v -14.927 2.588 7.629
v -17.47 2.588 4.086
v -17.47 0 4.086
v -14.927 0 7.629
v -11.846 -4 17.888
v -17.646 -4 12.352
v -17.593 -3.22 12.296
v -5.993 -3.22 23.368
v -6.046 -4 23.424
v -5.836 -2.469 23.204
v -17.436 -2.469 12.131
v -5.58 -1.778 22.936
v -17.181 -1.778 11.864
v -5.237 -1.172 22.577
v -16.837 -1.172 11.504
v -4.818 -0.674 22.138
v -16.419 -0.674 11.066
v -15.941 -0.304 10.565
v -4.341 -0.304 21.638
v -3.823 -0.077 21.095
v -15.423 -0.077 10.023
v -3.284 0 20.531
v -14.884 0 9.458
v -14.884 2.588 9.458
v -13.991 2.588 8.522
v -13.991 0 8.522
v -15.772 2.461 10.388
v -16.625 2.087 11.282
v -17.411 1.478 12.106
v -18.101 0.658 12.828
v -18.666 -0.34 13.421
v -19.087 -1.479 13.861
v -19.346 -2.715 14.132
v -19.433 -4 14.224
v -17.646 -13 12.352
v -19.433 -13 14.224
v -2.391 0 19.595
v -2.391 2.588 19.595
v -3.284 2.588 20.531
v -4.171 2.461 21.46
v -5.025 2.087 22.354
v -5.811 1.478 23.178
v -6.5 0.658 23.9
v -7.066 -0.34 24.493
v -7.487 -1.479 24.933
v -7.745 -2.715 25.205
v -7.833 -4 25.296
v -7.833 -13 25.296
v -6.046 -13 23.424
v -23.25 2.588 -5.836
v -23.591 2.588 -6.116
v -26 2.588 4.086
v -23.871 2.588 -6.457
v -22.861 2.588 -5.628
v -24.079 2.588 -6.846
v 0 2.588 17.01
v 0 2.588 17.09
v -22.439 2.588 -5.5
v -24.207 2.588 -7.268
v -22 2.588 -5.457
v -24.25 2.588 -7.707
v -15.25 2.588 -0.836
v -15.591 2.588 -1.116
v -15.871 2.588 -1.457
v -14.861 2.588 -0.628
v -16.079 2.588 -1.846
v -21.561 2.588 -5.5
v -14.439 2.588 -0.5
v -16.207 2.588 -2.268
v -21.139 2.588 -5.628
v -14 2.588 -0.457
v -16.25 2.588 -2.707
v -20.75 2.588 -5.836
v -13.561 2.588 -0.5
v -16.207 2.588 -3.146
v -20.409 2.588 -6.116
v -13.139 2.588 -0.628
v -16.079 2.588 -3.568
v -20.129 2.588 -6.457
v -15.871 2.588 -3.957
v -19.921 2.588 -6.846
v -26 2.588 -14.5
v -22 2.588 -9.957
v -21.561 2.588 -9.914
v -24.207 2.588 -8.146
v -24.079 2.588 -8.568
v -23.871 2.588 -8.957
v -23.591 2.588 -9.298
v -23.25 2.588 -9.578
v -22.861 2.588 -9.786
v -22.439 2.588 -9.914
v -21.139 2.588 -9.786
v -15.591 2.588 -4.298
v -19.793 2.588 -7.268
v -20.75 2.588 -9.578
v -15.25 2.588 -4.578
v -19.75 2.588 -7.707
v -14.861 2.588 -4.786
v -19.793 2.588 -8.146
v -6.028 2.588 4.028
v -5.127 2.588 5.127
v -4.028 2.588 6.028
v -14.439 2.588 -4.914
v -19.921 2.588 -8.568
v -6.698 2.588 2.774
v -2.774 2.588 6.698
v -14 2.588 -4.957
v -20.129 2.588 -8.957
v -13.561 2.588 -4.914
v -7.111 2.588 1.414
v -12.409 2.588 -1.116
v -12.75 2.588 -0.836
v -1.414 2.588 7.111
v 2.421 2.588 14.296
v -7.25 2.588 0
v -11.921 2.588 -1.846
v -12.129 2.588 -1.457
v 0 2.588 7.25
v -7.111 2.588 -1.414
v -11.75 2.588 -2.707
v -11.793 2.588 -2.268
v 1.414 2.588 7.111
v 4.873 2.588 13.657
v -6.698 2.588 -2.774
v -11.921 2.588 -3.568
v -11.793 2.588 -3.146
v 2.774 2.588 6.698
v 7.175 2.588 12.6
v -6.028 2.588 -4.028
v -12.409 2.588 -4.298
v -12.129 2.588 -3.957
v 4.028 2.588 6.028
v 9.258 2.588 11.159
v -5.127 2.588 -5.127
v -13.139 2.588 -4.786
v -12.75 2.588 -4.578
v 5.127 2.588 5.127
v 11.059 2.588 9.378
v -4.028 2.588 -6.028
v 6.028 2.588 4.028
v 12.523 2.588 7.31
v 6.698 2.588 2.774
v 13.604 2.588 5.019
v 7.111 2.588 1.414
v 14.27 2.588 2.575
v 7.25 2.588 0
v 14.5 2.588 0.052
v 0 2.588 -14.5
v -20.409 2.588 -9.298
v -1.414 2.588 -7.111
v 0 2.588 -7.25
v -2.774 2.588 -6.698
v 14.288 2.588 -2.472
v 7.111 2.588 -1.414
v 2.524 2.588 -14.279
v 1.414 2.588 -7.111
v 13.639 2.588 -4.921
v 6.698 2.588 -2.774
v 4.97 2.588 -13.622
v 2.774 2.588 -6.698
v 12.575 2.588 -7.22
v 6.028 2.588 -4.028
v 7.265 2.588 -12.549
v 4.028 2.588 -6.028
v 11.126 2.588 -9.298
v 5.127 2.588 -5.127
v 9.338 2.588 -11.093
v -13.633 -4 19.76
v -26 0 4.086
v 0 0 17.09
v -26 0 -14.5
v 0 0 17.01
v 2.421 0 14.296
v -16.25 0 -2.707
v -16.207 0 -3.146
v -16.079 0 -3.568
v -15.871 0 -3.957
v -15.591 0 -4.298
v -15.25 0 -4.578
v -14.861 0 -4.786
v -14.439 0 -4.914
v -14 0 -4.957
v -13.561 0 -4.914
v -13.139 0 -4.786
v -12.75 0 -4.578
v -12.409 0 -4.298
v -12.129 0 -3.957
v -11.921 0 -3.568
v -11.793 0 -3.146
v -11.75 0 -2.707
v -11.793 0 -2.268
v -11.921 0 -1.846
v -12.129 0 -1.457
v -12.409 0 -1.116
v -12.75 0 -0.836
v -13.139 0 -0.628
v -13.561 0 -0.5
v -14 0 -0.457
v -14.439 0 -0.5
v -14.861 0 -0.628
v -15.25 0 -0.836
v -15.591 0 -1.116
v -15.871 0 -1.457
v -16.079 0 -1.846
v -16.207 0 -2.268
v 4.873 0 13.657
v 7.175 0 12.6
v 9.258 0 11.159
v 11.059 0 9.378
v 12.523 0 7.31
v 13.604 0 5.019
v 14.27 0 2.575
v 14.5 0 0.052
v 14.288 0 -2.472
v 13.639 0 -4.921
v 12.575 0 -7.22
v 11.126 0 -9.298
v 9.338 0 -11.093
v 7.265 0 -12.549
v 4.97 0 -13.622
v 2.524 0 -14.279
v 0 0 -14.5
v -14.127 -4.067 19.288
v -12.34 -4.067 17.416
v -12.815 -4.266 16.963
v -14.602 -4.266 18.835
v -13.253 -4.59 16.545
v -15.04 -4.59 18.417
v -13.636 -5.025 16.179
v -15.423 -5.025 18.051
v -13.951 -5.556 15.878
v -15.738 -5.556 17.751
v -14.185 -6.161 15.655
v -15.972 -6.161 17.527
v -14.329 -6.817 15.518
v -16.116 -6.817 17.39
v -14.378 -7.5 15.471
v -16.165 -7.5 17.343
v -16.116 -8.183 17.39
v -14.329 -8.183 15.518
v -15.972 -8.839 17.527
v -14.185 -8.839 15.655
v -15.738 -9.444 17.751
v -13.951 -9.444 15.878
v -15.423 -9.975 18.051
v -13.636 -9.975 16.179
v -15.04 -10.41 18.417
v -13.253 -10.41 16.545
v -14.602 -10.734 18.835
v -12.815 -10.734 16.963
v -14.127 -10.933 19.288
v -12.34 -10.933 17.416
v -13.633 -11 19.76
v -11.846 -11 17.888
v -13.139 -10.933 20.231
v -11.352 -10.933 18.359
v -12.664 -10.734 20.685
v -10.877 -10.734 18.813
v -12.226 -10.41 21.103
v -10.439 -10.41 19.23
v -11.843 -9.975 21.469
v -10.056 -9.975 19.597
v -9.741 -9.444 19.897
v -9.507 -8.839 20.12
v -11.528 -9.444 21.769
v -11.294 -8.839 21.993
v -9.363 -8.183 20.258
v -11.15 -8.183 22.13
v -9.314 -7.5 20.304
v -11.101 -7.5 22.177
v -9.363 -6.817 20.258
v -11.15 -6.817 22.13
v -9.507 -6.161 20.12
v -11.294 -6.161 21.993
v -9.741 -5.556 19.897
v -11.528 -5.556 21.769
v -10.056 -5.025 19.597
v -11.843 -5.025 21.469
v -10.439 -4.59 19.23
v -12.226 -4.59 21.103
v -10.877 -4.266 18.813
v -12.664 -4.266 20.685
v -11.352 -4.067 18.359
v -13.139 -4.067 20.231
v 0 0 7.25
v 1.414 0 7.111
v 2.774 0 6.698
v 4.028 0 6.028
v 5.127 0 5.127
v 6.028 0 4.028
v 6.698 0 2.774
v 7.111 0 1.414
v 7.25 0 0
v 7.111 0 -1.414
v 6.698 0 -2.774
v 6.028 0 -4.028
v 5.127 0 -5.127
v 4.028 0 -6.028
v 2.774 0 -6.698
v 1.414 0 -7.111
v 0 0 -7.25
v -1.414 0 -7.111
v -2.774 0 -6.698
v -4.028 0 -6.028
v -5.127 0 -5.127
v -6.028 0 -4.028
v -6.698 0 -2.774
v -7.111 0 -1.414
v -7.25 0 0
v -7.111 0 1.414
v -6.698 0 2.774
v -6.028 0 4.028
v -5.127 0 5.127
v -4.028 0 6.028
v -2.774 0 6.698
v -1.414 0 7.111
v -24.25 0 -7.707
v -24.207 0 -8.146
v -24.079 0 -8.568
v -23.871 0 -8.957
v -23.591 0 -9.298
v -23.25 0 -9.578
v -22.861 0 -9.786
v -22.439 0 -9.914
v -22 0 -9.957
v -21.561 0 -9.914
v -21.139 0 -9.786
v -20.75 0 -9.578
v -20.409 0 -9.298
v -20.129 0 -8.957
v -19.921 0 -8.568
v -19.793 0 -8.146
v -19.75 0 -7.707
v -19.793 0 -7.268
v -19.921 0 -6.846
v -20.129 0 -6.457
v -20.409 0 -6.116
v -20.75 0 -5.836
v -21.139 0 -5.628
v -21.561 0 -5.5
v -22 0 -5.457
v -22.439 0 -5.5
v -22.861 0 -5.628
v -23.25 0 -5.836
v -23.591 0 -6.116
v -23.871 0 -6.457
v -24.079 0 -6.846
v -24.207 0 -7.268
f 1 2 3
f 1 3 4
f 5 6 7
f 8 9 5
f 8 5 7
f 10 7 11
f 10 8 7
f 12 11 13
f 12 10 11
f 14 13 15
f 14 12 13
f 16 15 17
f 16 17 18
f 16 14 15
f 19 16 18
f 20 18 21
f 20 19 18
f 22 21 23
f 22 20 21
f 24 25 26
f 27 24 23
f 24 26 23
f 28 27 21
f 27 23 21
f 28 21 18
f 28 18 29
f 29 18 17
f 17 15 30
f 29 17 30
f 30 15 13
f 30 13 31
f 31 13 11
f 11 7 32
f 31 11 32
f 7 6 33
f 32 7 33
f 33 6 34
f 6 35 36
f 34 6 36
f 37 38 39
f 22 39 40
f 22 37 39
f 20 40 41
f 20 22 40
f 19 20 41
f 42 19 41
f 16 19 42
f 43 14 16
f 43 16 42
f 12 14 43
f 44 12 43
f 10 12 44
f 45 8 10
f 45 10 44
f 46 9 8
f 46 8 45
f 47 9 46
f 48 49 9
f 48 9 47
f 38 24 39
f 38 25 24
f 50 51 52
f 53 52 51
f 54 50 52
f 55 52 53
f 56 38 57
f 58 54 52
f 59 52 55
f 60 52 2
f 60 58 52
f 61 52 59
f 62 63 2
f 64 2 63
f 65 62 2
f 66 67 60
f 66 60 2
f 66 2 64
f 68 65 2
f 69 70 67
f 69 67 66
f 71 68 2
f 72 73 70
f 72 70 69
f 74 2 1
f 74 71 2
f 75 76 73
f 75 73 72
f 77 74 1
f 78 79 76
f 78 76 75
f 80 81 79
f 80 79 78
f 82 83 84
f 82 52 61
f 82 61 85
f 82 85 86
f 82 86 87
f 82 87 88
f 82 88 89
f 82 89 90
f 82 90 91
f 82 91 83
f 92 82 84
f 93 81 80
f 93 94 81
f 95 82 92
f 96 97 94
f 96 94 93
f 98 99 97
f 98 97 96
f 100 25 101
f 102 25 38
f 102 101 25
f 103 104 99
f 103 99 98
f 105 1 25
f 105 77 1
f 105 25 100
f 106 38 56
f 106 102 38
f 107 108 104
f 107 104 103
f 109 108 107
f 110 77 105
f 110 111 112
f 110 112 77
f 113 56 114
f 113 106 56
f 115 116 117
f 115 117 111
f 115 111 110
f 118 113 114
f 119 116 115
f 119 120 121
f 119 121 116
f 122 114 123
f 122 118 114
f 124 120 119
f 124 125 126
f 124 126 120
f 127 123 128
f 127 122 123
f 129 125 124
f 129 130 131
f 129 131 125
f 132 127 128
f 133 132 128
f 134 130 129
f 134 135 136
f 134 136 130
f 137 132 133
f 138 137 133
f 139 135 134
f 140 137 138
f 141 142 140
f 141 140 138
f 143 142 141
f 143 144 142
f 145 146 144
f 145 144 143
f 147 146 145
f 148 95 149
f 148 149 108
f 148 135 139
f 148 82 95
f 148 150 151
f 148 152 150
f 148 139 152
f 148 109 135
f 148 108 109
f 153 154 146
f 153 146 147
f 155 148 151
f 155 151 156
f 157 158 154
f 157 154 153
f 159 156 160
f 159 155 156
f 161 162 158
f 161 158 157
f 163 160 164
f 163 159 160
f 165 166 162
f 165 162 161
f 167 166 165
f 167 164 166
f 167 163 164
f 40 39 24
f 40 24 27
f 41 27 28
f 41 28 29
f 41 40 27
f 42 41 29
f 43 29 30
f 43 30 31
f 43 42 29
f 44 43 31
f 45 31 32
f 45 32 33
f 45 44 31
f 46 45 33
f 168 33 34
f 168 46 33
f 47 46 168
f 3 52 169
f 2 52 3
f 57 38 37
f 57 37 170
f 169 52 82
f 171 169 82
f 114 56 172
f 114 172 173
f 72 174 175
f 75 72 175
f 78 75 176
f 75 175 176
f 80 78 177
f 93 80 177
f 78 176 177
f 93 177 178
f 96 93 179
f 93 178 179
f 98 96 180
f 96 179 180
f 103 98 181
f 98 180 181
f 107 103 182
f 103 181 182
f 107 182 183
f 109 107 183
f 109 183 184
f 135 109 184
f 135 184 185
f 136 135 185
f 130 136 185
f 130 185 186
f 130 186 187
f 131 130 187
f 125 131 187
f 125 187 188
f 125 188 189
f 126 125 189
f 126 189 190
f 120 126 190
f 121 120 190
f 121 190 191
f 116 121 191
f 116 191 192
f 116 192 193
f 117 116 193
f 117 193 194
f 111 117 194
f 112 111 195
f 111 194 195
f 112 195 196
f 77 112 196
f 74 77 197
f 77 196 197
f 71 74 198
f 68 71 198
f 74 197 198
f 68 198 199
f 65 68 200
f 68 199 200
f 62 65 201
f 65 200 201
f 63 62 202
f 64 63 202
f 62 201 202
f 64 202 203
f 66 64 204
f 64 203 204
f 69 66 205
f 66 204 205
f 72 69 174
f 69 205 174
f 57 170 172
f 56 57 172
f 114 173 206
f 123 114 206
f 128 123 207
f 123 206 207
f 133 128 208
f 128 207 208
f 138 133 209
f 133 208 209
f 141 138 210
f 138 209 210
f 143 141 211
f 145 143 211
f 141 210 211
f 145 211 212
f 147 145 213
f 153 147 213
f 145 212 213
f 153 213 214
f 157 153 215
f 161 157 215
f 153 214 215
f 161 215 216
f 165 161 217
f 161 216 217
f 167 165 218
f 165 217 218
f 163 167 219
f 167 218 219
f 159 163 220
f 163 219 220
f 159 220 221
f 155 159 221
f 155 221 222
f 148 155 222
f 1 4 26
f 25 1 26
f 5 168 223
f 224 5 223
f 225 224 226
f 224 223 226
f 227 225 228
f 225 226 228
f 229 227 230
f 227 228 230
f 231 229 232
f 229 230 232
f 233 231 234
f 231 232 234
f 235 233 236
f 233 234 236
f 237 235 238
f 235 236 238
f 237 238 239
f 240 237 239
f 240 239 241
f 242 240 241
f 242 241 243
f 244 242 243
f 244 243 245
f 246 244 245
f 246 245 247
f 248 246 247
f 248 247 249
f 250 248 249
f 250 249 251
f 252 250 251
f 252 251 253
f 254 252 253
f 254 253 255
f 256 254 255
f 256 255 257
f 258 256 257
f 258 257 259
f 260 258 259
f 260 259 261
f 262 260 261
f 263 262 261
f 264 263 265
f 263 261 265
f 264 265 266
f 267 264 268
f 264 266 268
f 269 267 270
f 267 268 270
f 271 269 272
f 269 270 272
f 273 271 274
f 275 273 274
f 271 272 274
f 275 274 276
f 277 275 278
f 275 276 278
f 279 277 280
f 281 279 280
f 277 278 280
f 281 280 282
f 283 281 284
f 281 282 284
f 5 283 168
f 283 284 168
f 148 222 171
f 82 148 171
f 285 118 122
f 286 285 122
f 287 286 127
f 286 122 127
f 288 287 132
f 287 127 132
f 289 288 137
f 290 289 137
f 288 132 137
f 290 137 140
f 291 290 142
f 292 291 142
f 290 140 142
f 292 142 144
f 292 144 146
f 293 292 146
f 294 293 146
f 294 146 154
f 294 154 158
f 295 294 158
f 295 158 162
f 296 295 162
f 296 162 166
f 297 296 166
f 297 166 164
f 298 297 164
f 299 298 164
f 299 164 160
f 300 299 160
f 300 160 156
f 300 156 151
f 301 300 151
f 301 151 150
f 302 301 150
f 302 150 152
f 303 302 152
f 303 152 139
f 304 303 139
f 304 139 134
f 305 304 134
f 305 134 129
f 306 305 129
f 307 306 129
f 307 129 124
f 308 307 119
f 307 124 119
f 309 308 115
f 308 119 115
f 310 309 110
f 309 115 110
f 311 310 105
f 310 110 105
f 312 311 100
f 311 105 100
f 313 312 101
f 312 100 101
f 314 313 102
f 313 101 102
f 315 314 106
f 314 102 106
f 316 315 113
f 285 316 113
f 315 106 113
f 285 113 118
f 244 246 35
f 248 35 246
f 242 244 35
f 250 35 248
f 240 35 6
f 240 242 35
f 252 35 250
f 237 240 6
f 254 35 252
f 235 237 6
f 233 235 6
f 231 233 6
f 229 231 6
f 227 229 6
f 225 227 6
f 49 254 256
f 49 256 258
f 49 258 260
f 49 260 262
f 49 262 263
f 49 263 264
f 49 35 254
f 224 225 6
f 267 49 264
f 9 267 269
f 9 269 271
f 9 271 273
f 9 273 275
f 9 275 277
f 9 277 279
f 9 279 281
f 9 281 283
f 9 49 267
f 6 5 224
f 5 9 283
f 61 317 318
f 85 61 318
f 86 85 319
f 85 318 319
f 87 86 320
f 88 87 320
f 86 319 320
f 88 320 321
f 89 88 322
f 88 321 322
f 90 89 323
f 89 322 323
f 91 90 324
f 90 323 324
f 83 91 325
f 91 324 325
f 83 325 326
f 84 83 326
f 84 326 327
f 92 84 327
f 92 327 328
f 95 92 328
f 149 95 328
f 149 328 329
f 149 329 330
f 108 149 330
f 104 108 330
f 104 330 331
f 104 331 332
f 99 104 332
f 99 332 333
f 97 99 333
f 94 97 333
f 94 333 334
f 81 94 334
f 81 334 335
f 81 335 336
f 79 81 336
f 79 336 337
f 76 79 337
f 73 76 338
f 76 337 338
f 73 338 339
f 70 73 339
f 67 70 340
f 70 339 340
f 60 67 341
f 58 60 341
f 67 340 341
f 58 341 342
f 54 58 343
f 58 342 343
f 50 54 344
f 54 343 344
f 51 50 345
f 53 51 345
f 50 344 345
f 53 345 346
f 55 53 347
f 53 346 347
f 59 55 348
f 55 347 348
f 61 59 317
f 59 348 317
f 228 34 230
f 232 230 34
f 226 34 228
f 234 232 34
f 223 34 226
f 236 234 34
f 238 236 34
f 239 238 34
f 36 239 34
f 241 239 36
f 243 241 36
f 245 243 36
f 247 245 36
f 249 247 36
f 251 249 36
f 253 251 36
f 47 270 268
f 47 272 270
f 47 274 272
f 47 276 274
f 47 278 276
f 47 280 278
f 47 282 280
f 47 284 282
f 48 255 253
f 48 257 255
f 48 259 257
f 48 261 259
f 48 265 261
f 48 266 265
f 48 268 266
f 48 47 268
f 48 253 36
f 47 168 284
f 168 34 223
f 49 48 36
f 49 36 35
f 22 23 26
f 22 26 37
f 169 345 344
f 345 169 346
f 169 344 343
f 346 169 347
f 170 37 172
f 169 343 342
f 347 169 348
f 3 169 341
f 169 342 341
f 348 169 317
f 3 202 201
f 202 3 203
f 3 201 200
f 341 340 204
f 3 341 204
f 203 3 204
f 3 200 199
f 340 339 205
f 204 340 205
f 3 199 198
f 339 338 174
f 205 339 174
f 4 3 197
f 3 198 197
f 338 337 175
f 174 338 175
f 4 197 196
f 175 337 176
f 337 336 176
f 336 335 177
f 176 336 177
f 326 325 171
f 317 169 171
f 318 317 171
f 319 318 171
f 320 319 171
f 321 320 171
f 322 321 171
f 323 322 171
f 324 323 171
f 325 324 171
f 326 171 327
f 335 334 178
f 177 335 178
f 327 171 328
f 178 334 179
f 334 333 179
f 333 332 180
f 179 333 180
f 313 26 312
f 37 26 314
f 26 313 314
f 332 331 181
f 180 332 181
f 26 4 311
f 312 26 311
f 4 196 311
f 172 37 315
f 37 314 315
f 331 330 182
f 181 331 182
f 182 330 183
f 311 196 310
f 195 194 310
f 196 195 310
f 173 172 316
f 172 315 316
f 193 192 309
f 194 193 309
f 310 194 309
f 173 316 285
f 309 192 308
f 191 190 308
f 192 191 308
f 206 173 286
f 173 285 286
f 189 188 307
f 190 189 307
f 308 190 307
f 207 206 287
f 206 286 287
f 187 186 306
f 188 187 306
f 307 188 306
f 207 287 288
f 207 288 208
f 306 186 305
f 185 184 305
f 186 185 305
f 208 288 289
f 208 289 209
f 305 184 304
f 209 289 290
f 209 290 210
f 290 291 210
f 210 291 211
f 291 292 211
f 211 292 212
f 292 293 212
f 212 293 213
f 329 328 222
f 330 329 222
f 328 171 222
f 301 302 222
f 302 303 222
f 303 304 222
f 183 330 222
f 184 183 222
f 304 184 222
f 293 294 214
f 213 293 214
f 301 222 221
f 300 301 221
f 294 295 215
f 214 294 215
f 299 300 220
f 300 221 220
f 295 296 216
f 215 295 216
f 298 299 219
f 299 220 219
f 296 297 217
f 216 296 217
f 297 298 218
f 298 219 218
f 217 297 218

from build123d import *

# Parameters (mm, degrees)
BOSS_EXTRUDE1_DEPTH           = 3.175
CONVERT_SOLID1_START          = 2.588
CONVERT_SOLID1_DEPTH          = 0.587
EDGE_FLANGE1_STRIP_W          = 18.352
EDGE_FLANGE1_STRIP_H          = 2.588
EDGE_FLANGE1_STRIP_CUT_DEPTH  = 16.036353891
EDGE_FLANGE1_RELIEF_W         = 19.646
EDGE_FLANGE1_RELIEF_H         = 1.294
EDGE_FLANGE1_RELIEF_CUT_DEPTH = 2.588
EDGE_FLANGE1_DEPTH            = 16.036353891
SKETCH9_R                     = 3.5
CUT_EXTRUDE1_DEPTH            = 47.081558227
CUT_EXTRUDE2_DEPTH            = 41.148221328
M4_CLEARANCE_HOLE1_D          = 4.5
BOSS_EXTRUDE2_DEPTH           = 2.588
SKETCH19_R                    = 7.25
CUT_EXTRUDE3_DEPTH            = 41.148221328
SKETCH20_W                    = 2
SKETCH20_H                    = 21.253234492
CUT_EXTRUDE4_DEPTH            = 10


# Read off the part's stored shape, not the designer's step: Convert-Solid1
# Sheet-metal steps are written as plain solids
with BuildPart() as part:
    # Sketch1 → Boss-Extrude1 (new body)
    with BuildSketch(Plane(origin=(0, 0, 0), x_dir=(1, 0, 0), z_dir=(0, 1, 0))):
        with BuildLine():
            Line((0, 14.5), (-27, 14.5))
            Line((-27, 14.5), (-27, -4.086))
            Line((-27, -4.086), (-19.43303559, -4.086))
            Line((-19.43303559, -4.086), (-19.43303559, -14.223687844))
            Line((-19.43303559, -14.223687844), (-7.832786234, -25.296124838))
            Line((-7.832786234, -25.296124838), (0, -25.296124838))
            Line((0, -25.296124838), (0, -14.5))
            ThreePointArc((0, -14.5), (14.5, 0), (0, 14.5))
        make_face()
    extrude(amount=BOSS_EXTRUDE1_DEPTH)

    # Convert-Solid1 outline → Convert-Solid1 (cut)
    with BuildSketch(Plane(origin=(0, 0, 0), x_dir=(1, 0, 0), z_dir=(0, 1, 0)).offset(CONVERT_SOLID1_START)):
        with BuildLine():
            Line((0, 14.5), (-27, 14.5))
            Line((-27, 14.5), (-27, -4.086))
            Line((-27, -4.086), (-19.43303559, -4.086))
            Line((-19.43303559, -4.086), (-19.43303559, -14.223687844))
            Line((-19.43303559, -14.223687844), (-7.832786234, -25.296124838))
            Line((-7.832786234, -25.296124838), (0, -25.296124838))
            Line((0, -25.296124838), (0, -14.5))
            ThreePointArc((0, -14.5), (14.5, 0), (0, 14.5))
        make_face()
    extrude(amount=CONVERT_SOLID1_DEPTH, mode=Mode.SUBTRACT)

    # Edge-Flange1 strip (across the edge) → Edge-Flange1 strip cut (cut)
    with BuildSketch(Plane(origin=(-7.832786234, 0, 25.296124838), x_dir=(0.6904585088002791, -3.4914813388431334e-15, -0.7233719980931629), z_dir=(-0.7233719980931629, 0, -0.6904585088002791))):
        with Locations((-2.588, -1.294)):
            Rectangle(EDGE_FLANGE1_STRIP_W, EDGE_FLANGE1_STRIP_H)
    extrude(amount=EDGE_FLANGE1_STRIP_CUT_DEPTH, mode=Mode.SUBTRACT)

    # Edge-Flange1 relief (on the sheet) → Edge-Flange1 relief cut (cut)
    with BuildSketch(Plane(origin=(-3.284045578, 0, 20.530550115), x_dir=(0.6904585088002791, -6.982962677686267e-15, -0.7233719980931629), z_dir=(0, -1, 0))):
        with Locations((-8.529, 0.647)):
            Rectangle(EDGE_FLANGE1_RELIEF_W, EDGE_FLANGE1_RELIEF_H)
        with Locations((-8.529, -16.683353891)):
            Rectangle(EDGE_FLANGE1_RELIEF_W, EDGE_FLANGE1_RELIEF_H)
    extrude(amount=-EDGE_FLANGE1_RELIEF_CUT_DEPTH, mode=Mode.SUBTRACT)

    # Edge-Flange1 section (across the edge) → Edge-Flange1 (add)
    with BuildSketch(Plane(origin=(-7.832786234, 0, 25.296124838), x_dir=(0.6904585088002791, -3.4914813388431334e-15, -0.7233719980931629), z_dir=(-0.7233719980931629, 0, -0.6904585088002791))):
        with BuildLine():
            Line((0, 4), (0, 13))
            Line((0, 13), (2.588, 13))
            Line((2.588, 13), (2.588, 4))
            ThreePointArc((2.588, 4), (3.759572875, 1.171572875), (6.588, 0))
            Line((6.588, 0), (6.588, -2.588))
            ThreePointArc((6.588, -2.588), (1.929580526, -0.658419474), (0, 4))
        make_face()
    extrude(amount=EDGE_FLANGE1_DEPTH)

    # Sketch9 → Cut-Extrude1 (cut, through all)
    with BuildSketch(Plane(origin=(-16.368508108, 0, 17.148779057), x_dir=(0.7233719980931632, 3.1973878914611357e-15, 0.6904585088002789), z_dir=(-0.6904585088002789, 3.4046985453530564e-15, 0.7233719980931632))):
        with Locations(Location((3.78172946, -7.5, 0), (0, 0, 90))):
            Circle(SKETCH9_R)
    extrude(amount=-CUT_EXTRUDE1_DEPTH, mode=Mode.SUBTRACT)

    # Sketch10 → Cut-Extrude2 (cut, through all)
    with BuildSketch(Plane(origin=(0, 2.588, 0), x_dir=(1, 0, 0), z_dir=(0, 1, 0))):
        Polygon((-19.43303559, -4.086), (-17.470094505, -4.086), (-14.926884989, -7.628616445), (-19.43303559, -12.349570886), align=None)
        Polygon((0, -25.296124838), (-7.832786234, -25.296124838), (0, -17.08995726), align=None)
    extrude(amount=-CUT_EXTRUDE2_DEPTH, mode=Mode.SUBTRACT)

    # M4 Clearance Hole1 (through all)
    with Locations(Plane(origin=(0, 2.588, 0), x_dir=(1, 0, 0), z_dir=(0, 1, 0))):
        with Locations((-22, 7.707), (-14, 2.707)):
            Hole(M4_CLEARANCE_HOLE1_D / 2)

    # Sketch17 → Boss-Extrude2 (add)
    with BuildSketch(Plane(origin=(0, 2.588, 0), x_dir=(1, 0, 0), z_dir=(0, 1, 0))):
        Polygon((-1.098945785, -18.241288728), (4.611253989, -11.842333594), (-0.672962036, -12.348247452), align=None)
    extrude(amount=-BOSS_EXTRUDE2_DEPTH)

    # Sketch19 → Cut-Extrude3 (cut, through all)
    with BuildSketch(Plane(origin=(0, 2.588, 0), x_dir=(1, 0, 0), z_dir=(0, 1, 0))):
        with Locations(Location((0, 0, 0), (0, 0, 270))):
            Circle(SKETCH19_R)
    extrude(amount=-CUT_EXTRUDE3_DEPTH, mode=Mode.SUBTRACT)

    # Sketch20 → Cut-Extrude4 (cut)
    with BuildSketch(Plane(origin=(0, 2.588, 0), x_dir=(1, 0, 0), z_dir=(0, 1, 0))):
        with Locations((-27, 5.207)):
            Rectangle(SKETCH20_W, SKETCH20_H)
    extrude(amount=-CUT_EXTRUDE4_DEPTH, mode=Mode.SUBTRACT)


solid = part.part
